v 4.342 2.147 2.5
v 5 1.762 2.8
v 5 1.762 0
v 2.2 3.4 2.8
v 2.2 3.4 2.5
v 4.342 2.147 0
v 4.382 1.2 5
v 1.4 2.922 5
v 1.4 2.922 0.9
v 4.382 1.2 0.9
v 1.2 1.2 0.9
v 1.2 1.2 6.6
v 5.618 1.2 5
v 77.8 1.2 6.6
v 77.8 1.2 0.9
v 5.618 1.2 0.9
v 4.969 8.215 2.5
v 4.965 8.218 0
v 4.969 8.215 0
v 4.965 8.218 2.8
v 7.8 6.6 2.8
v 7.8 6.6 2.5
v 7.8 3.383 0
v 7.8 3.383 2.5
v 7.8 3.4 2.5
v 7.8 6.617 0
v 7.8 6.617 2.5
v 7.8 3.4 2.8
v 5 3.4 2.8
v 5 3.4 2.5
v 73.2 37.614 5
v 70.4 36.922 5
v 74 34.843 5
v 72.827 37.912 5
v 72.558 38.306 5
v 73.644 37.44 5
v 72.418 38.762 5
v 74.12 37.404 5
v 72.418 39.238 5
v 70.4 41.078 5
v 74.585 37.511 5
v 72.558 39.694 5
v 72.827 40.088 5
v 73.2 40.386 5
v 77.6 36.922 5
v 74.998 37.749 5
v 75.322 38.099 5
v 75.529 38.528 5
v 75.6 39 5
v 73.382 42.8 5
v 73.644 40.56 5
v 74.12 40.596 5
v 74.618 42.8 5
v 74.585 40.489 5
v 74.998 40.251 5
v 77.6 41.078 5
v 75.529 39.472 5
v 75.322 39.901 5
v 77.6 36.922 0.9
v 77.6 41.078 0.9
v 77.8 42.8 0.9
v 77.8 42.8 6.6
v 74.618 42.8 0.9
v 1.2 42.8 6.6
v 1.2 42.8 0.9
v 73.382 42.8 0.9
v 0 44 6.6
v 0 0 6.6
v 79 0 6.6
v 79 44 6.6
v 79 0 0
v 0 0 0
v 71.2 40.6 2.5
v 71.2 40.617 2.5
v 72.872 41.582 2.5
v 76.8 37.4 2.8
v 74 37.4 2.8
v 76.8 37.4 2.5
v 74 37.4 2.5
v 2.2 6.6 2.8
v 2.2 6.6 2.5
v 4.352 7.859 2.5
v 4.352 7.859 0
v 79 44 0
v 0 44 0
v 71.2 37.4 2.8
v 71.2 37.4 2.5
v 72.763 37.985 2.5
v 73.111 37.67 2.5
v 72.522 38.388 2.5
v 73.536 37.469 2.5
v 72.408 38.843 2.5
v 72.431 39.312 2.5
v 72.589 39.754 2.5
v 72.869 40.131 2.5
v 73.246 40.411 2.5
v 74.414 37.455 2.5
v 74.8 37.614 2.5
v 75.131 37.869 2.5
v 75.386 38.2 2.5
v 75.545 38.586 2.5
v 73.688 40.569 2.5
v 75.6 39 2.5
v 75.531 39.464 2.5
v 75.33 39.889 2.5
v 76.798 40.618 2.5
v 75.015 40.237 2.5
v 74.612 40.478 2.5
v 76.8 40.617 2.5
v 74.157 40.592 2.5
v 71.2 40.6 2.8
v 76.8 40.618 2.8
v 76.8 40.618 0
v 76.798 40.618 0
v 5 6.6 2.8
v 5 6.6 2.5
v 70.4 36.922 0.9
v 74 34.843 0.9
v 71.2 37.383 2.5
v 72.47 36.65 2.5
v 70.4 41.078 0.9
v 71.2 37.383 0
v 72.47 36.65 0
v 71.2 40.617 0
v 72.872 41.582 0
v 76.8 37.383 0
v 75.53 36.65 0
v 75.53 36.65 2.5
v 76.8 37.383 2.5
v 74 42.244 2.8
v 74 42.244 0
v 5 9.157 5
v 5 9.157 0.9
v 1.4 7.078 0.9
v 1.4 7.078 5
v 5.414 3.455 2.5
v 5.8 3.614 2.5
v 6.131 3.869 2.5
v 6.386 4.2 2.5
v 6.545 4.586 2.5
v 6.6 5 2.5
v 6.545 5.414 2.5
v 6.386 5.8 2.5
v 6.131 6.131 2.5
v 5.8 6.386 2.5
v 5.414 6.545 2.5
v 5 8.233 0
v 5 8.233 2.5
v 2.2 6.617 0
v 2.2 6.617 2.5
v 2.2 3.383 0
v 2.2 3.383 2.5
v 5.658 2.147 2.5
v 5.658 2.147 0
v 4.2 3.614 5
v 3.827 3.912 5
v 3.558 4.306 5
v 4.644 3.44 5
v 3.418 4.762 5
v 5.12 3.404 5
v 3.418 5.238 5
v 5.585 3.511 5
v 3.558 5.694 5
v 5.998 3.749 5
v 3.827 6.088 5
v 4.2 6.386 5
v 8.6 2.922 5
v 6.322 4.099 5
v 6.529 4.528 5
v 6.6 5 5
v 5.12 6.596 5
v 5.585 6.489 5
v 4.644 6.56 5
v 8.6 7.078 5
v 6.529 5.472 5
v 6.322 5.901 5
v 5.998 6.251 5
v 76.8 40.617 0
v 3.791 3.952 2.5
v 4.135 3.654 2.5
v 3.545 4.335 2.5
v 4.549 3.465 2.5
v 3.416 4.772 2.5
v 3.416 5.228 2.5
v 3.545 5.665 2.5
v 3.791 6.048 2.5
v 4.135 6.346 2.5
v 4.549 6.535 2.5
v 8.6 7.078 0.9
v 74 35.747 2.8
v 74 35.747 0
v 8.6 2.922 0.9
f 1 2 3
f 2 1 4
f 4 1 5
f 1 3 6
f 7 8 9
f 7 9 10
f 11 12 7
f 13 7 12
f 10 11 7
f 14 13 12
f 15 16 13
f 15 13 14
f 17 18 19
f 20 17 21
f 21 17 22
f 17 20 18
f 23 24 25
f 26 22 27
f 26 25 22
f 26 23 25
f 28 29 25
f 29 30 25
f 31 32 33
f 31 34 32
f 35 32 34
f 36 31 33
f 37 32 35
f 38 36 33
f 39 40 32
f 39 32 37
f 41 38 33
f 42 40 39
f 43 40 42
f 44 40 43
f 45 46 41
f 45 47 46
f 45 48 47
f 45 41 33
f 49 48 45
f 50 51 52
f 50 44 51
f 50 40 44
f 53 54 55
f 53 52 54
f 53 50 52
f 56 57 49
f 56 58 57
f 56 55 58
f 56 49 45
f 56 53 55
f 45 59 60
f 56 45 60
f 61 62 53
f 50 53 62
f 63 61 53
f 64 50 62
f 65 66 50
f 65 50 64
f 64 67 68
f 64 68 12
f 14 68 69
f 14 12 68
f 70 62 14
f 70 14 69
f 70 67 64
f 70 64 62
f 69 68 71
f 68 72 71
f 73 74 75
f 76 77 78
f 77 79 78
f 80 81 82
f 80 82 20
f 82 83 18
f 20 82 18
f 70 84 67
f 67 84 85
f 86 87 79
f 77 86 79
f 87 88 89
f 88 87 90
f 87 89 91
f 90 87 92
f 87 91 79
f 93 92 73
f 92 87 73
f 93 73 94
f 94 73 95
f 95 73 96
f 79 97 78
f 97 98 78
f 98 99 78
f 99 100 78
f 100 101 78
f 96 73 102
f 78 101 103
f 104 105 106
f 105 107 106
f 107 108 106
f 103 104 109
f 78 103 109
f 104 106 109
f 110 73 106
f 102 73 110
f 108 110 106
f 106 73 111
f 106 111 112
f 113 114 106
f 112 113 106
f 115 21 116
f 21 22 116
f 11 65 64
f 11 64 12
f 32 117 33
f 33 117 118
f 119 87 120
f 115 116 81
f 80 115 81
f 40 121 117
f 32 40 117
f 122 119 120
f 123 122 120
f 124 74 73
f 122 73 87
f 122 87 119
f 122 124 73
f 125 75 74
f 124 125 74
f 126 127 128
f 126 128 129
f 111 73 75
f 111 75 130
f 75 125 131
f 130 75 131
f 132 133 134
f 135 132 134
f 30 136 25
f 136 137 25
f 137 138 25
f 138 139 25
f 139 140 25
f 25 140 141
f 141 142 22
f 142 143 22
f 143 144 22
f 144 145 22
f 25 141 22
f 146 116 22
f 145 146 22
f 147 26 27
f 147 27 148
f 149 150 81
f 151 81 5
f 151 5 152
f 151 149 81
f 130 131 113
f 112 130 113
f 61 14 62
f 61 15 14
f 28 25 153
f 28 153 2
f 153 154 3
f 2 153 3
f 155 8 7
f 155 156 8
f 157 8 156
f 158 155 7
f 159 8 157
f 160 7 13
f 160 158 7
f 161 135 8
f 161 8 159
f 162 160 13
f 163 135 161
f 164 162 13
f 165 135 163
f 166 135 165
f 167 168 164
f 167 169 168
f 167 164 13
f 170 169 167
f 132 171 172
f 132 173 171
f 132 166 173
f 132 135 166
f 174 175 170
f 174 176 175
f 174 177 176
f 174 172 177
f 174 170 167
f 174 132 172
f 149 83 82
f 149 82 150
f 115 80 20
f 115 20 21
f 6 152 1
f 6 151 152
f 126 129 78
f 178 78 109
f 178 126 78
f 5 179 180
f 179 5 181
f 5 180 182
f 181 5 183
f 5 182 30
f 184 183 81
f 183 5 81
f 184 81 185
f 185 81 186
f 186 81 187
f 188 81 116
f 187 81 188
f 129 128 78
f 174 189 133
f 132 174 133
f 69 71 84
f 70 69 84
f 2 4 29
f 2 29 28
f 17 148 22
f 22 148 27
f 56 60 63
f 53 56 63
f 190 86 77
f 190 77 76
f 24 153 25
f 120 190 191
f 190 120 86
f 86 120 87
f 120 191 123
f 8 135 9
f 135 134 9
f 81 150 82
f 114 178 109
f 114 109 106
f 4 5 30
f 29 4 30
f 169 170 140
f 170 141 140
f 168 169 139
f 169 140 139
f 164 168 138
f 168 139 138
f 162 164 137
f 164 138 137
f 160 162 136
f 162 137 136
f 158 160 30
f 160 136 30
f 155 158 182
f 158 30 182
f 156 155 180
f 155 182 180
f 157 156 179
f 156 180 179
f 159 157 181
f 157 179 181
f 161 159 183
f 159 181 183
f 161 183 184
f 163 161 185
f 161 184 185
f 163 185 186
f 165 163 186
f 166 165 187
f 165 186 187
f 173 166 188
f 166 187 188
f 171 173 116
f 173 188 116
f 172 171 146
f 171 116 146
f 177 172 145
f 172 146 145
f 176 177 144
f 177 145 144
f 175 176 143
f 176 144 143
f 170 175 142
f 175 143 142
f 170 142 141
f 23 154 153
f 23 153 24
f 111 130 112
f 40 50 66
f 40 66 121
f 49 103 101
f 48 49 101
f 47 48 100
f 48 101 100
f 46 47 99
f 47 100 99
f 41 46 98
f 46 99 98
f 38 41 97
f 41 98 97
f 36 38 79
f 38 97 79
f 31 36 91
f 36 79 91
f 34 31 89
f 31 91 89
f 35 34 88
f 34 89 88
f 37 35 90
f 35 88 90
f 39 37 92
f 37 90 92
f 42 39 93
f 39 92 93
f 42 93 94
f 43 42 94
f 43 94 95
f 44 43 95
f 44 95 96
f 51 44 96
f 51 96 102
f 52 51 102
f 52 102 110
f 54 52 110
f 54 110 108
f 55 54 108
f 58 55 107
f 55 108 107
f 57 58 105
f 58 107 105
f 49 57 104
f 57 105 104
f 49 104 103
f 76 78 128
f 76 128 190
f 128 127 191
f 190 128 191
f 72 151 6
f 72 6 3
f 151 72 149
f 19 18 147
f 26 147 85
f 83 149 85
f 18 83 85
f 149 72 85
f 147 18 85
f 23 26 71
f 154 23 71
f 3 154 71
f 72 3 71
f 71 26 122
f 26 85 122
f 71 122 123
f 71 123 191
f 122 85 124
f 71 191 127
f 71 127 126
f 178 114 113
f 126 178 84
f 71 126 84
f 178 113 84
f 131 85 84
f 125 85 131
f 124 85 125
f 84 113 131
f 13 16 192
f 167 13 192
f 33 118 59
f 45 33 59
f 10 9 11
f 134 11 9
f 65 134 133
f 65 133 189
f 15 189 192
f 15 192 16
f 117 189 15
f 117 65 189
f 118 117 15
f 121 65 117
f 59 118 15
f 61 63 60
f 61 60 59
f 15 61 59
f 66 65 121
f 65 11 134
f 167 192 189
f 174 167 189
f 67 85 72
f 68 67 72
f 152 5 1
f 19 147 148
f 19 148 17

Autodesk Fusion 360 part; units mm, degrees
sketch "Sketch1" plane through (0, 0, 0) normal (0, 0, 1) x (1, 0, 0)
  line L0 (0, 0) -> (79, 0)
  line L1 (79, 0) -> (79, 44)
  line L2 (79, 44) -> (0, 44)
  line L3 (0, 44) -> (0, 0)
  line L4 (1.2, 1.2) -> (77.8, 1.2)
  line L5 (77.8, 1.2) -> (77.8, 42.8)
  line L6 (77.8, 42.8) -> (1.2, 42.8)
  line L7 (1.2, 42.8) -> (1.2, 1.2)
  line L8 (2, 42) -> (77, 42) construction
  line L9 (77, 42) -> (77, 2) construction
  line L10 (77, 2) -> (2, 2) construction
  line L11 (2, 2) -> (2, 42) construction
  circle A0 centre (74, 39) radius 1.6
  circle A1 centre (5, 5) radius 1.6
  line L12 (74, 42.2332) -> (71.2, 40.6166)
  line L13 (71.2, 40.6166) -> (71.2, 37.3834)
  line L14 (71.2, 37.3834) -> (74, 35.7668)
  line L15 (74, 35.7668) -> (76.8, 37.3834)
  line L16 (76.8, 37.3834) -> (76.8, 40.6166)
  line L17 (76.8, 40.6166) -> (74, 42.2332)
  line L18 (5, 8.2332) -> (2.2, 6.6166)
  line L19 (2.2, 6.6166) -> (2.2, 3.3834)
  line L20 (2.2, 3.3834) -> (5, 1.7668)
  line L21 (5, 1.7668) -> (7.8, 3.3834)
  line L22 (7.8, 3.3834) -> (7.8, 6.6166)
  line L23 (7.8, 6.6166) -> (5, 8.2332)
  line L24 (1.4, 2.9215) -> (5, 0.8431)
  line L25 (5, 0.8431) -> (8.6, 2.9215)
  line L26 (8.6, 2.9215) -> (8.6, 7.0785)
  line L27 (8.6, 7.0785) -> (5, 9.1569)
  line L28 (5, 9.1569) -> (1.4, 7.0785)
  line L29 (1.4, 7.0785) -> (1.4, 2.9215)
  line L30 (70.4, 36.9215) -> (74, 34.8431)
  line L31 (74, 34.8431) -> (77.6, 36.9215)
  line L32 (77.6, 36.9215) -> (77.6, 41.0785)
  line L33 (77.6, 41.0785) -> (74, 43.1569)
  line L34 (74, 43.1569) -> (70.4, 41.0785)
  line L35 (70.4, 41.0785) -> (70.4, 36.9215)
  point P0 (39.5, 42)
  point P1 (39.5, 44)
  point P2 (77, 22)
  point P3 (79, 22)
  point P4 (74, 39)
  point P5 (5, 5)
  dimension "d1" = 79
  dimension "d2" = 44
  dimension "d9" = -1.2
  dimension "d14" = 75
  dimension "d15" = 40
  dimension "d16" = 0.8
  dimension "d21" = 3.2
  dimension "d33" = 2.8
  dimension "d34" = 2.8
  dimension "d35" = 0.8
  dimension "d36" = 0.8
  dimension "d61" = 3.2
  dimension "d63" = 3
  dimension "d64" = 3
  dimension "d65" = 3
  dimension "d66" = 3
extrude "Extrude13" add sketch "Sketch1" along normal blind 5 contours L12 L13 L14 L15 L16 L17 makes body 1
extrude "Extrude14" add sketch "Sketch1" along normal blind 5 contours L6 L33 L34 | L6 L30 L31 L32 L33 L34 L35 bodies 1
extrude "Extrude15" add sketch "Sketch1" along normal blind 5 separate body contours L4 L24 L25 L26 L27 L28 L29 | L4 L24 L25 | L18 L19 L20 L21 L22 L23 makes body 2
extrude "Extrude16" add sketch "Sketch1" along normal blind 6.6 separate body contours L0 L1 L2 L3 | L4 L24 L25 | L6 L33 L34 makes body 3
extrude "Extrude17" add sketch "Sketch1" along normal blind 0.9 contours L4 L5 L6 L7 L24 L25 L26 L27 L28 L29 L30 L31 L32 L33 L34 L35 bodies 1 2 3
extrude "Extrude18" cut sketch "Sketch1" along normal blind 2.5 contours L12 L13 L14 L15 L16 L17 bodies 1
extrude "Extrude19" cut sketch "Sketch1" along normal blind 2.5 contours L18 L19 L20 L21 L22 L23 bodies 1
sketch "Sketch3" plane through (0, 0, 0) normal (0, 0, 1) x (1, 0, 0)
  line L0 (71.2, 37.4) -> (76.8, 37.4)
  line L1 (76.8, 37.4) -> (74, 35.7468)
  line L2 (74, 35.7468) -> (71.2, 37.4)
  line L3 (71.2, 40.6) -> (76.8, 40.618)
  line L4 (71.2, 40.6) -> (74, 42.2444)
  line L5 (74, 42.2444) -> (76.8, 40.618)
  line L6 (71.2, 37.4) -> (72.4601, 37.4)
  line L7 (2.2, 3.4) -> (7.8, 3.4)
  line L8 (7.8, 3.4) -> (5, 1.7617)
  line L9 (5, 1.7617) -> (2.2, 3.4)
  line L10 (2.2, 6.6) -> (4.9648, 8.2176)
  line L11 (4.9648, 8.2176) -> (7.8, 6.6)
  line L12 (7.8, 6.6) -> (2.2, 6.6)
extrude "Extrude20" cut sketch "Sketch3" along normal blind 2.8 contours L7 L8 L9 | L10 L11 L12 bodies 1
extrude "Extrude21" cut sketch "Sketch3" along normal blind 2.8 contours L0 L1 L2 L6 | L3 L4 L5 bodies 1
equation "d1 = TotalDepth"
equation "d2 = TotalWidth"
equation "LayerHeight = 0.3 mm"
equation "Tolerance = 0.1 mm"
equation "ExtrusionWidth = 0.4 mm"
equation "TotalWidth = 44 mm"
equation "TotalDepth = 79 mm"
equation "TotalHeight = 35 mm"
equation "d9 = -3 * ExtrusionWidth"
equation "PCBWidth = 75 mm"
equation "PCBLength = 40 mm"
equation "PCBThickness = 1.6 mm"
equation "PCBSolderingHeight = 4 mm"
equation "d14 = PCBWidth"
equation "d15 = PCBLength"
equation "d21 = M3Adjusted"
equation "M3Adjusted = 3 mm + Tolerance * 2"
equation "PCBSupportHeight = PCBSolderingHeight + Tolerance + BaseThickness"
equation "BottomCaseHeight = PCBSolderingHeight + Tolerance + PCBThickness + BaseThickness"
equation "NutWidth = 5.5 mm + Tolerance"
equation "NutHeight = 2.4 mm + Tolerance"
equation "d33 = NutWidth / 2"
equation "d34 = NutWidth / 2"
equation "d35 = 2 * ExtrusionWidth"
equation "d36 = 2 * ExtrusionWidth"
equation "NutSupportHeight = NutHeight + Tolerance + BaseThickness"
equation "BaseThickness = 3 * LayerHeight"
equation "HoleSpreading = PCBHoleSpread + M3Adjusted / 2"
equation "d61 = M3Adjusted"
equation "PCBHoleSpread = 1.40 mm"
equation "d63 = HoleSpreading"
equation "d64 = HoleSpreading"
equation "d65 = HoleSpreading"
equation "d66 = HoleSpreading"
equation "d67 = PCBSupportHeight"
equation "d69 = PCBSupportHeight"
equation "d71 = PCBSupportHeight"
equation "d73 = BottomCaseHeight"
equation "d75 = BaseThickness"
equation "d77 = NutHeight"
equation "d79 = NutHeight"
equation "d82 = NutHeight + LayerHeight"
equation "d84 = NutHeight + LayerHeight"
properties part number "Configuration1"
